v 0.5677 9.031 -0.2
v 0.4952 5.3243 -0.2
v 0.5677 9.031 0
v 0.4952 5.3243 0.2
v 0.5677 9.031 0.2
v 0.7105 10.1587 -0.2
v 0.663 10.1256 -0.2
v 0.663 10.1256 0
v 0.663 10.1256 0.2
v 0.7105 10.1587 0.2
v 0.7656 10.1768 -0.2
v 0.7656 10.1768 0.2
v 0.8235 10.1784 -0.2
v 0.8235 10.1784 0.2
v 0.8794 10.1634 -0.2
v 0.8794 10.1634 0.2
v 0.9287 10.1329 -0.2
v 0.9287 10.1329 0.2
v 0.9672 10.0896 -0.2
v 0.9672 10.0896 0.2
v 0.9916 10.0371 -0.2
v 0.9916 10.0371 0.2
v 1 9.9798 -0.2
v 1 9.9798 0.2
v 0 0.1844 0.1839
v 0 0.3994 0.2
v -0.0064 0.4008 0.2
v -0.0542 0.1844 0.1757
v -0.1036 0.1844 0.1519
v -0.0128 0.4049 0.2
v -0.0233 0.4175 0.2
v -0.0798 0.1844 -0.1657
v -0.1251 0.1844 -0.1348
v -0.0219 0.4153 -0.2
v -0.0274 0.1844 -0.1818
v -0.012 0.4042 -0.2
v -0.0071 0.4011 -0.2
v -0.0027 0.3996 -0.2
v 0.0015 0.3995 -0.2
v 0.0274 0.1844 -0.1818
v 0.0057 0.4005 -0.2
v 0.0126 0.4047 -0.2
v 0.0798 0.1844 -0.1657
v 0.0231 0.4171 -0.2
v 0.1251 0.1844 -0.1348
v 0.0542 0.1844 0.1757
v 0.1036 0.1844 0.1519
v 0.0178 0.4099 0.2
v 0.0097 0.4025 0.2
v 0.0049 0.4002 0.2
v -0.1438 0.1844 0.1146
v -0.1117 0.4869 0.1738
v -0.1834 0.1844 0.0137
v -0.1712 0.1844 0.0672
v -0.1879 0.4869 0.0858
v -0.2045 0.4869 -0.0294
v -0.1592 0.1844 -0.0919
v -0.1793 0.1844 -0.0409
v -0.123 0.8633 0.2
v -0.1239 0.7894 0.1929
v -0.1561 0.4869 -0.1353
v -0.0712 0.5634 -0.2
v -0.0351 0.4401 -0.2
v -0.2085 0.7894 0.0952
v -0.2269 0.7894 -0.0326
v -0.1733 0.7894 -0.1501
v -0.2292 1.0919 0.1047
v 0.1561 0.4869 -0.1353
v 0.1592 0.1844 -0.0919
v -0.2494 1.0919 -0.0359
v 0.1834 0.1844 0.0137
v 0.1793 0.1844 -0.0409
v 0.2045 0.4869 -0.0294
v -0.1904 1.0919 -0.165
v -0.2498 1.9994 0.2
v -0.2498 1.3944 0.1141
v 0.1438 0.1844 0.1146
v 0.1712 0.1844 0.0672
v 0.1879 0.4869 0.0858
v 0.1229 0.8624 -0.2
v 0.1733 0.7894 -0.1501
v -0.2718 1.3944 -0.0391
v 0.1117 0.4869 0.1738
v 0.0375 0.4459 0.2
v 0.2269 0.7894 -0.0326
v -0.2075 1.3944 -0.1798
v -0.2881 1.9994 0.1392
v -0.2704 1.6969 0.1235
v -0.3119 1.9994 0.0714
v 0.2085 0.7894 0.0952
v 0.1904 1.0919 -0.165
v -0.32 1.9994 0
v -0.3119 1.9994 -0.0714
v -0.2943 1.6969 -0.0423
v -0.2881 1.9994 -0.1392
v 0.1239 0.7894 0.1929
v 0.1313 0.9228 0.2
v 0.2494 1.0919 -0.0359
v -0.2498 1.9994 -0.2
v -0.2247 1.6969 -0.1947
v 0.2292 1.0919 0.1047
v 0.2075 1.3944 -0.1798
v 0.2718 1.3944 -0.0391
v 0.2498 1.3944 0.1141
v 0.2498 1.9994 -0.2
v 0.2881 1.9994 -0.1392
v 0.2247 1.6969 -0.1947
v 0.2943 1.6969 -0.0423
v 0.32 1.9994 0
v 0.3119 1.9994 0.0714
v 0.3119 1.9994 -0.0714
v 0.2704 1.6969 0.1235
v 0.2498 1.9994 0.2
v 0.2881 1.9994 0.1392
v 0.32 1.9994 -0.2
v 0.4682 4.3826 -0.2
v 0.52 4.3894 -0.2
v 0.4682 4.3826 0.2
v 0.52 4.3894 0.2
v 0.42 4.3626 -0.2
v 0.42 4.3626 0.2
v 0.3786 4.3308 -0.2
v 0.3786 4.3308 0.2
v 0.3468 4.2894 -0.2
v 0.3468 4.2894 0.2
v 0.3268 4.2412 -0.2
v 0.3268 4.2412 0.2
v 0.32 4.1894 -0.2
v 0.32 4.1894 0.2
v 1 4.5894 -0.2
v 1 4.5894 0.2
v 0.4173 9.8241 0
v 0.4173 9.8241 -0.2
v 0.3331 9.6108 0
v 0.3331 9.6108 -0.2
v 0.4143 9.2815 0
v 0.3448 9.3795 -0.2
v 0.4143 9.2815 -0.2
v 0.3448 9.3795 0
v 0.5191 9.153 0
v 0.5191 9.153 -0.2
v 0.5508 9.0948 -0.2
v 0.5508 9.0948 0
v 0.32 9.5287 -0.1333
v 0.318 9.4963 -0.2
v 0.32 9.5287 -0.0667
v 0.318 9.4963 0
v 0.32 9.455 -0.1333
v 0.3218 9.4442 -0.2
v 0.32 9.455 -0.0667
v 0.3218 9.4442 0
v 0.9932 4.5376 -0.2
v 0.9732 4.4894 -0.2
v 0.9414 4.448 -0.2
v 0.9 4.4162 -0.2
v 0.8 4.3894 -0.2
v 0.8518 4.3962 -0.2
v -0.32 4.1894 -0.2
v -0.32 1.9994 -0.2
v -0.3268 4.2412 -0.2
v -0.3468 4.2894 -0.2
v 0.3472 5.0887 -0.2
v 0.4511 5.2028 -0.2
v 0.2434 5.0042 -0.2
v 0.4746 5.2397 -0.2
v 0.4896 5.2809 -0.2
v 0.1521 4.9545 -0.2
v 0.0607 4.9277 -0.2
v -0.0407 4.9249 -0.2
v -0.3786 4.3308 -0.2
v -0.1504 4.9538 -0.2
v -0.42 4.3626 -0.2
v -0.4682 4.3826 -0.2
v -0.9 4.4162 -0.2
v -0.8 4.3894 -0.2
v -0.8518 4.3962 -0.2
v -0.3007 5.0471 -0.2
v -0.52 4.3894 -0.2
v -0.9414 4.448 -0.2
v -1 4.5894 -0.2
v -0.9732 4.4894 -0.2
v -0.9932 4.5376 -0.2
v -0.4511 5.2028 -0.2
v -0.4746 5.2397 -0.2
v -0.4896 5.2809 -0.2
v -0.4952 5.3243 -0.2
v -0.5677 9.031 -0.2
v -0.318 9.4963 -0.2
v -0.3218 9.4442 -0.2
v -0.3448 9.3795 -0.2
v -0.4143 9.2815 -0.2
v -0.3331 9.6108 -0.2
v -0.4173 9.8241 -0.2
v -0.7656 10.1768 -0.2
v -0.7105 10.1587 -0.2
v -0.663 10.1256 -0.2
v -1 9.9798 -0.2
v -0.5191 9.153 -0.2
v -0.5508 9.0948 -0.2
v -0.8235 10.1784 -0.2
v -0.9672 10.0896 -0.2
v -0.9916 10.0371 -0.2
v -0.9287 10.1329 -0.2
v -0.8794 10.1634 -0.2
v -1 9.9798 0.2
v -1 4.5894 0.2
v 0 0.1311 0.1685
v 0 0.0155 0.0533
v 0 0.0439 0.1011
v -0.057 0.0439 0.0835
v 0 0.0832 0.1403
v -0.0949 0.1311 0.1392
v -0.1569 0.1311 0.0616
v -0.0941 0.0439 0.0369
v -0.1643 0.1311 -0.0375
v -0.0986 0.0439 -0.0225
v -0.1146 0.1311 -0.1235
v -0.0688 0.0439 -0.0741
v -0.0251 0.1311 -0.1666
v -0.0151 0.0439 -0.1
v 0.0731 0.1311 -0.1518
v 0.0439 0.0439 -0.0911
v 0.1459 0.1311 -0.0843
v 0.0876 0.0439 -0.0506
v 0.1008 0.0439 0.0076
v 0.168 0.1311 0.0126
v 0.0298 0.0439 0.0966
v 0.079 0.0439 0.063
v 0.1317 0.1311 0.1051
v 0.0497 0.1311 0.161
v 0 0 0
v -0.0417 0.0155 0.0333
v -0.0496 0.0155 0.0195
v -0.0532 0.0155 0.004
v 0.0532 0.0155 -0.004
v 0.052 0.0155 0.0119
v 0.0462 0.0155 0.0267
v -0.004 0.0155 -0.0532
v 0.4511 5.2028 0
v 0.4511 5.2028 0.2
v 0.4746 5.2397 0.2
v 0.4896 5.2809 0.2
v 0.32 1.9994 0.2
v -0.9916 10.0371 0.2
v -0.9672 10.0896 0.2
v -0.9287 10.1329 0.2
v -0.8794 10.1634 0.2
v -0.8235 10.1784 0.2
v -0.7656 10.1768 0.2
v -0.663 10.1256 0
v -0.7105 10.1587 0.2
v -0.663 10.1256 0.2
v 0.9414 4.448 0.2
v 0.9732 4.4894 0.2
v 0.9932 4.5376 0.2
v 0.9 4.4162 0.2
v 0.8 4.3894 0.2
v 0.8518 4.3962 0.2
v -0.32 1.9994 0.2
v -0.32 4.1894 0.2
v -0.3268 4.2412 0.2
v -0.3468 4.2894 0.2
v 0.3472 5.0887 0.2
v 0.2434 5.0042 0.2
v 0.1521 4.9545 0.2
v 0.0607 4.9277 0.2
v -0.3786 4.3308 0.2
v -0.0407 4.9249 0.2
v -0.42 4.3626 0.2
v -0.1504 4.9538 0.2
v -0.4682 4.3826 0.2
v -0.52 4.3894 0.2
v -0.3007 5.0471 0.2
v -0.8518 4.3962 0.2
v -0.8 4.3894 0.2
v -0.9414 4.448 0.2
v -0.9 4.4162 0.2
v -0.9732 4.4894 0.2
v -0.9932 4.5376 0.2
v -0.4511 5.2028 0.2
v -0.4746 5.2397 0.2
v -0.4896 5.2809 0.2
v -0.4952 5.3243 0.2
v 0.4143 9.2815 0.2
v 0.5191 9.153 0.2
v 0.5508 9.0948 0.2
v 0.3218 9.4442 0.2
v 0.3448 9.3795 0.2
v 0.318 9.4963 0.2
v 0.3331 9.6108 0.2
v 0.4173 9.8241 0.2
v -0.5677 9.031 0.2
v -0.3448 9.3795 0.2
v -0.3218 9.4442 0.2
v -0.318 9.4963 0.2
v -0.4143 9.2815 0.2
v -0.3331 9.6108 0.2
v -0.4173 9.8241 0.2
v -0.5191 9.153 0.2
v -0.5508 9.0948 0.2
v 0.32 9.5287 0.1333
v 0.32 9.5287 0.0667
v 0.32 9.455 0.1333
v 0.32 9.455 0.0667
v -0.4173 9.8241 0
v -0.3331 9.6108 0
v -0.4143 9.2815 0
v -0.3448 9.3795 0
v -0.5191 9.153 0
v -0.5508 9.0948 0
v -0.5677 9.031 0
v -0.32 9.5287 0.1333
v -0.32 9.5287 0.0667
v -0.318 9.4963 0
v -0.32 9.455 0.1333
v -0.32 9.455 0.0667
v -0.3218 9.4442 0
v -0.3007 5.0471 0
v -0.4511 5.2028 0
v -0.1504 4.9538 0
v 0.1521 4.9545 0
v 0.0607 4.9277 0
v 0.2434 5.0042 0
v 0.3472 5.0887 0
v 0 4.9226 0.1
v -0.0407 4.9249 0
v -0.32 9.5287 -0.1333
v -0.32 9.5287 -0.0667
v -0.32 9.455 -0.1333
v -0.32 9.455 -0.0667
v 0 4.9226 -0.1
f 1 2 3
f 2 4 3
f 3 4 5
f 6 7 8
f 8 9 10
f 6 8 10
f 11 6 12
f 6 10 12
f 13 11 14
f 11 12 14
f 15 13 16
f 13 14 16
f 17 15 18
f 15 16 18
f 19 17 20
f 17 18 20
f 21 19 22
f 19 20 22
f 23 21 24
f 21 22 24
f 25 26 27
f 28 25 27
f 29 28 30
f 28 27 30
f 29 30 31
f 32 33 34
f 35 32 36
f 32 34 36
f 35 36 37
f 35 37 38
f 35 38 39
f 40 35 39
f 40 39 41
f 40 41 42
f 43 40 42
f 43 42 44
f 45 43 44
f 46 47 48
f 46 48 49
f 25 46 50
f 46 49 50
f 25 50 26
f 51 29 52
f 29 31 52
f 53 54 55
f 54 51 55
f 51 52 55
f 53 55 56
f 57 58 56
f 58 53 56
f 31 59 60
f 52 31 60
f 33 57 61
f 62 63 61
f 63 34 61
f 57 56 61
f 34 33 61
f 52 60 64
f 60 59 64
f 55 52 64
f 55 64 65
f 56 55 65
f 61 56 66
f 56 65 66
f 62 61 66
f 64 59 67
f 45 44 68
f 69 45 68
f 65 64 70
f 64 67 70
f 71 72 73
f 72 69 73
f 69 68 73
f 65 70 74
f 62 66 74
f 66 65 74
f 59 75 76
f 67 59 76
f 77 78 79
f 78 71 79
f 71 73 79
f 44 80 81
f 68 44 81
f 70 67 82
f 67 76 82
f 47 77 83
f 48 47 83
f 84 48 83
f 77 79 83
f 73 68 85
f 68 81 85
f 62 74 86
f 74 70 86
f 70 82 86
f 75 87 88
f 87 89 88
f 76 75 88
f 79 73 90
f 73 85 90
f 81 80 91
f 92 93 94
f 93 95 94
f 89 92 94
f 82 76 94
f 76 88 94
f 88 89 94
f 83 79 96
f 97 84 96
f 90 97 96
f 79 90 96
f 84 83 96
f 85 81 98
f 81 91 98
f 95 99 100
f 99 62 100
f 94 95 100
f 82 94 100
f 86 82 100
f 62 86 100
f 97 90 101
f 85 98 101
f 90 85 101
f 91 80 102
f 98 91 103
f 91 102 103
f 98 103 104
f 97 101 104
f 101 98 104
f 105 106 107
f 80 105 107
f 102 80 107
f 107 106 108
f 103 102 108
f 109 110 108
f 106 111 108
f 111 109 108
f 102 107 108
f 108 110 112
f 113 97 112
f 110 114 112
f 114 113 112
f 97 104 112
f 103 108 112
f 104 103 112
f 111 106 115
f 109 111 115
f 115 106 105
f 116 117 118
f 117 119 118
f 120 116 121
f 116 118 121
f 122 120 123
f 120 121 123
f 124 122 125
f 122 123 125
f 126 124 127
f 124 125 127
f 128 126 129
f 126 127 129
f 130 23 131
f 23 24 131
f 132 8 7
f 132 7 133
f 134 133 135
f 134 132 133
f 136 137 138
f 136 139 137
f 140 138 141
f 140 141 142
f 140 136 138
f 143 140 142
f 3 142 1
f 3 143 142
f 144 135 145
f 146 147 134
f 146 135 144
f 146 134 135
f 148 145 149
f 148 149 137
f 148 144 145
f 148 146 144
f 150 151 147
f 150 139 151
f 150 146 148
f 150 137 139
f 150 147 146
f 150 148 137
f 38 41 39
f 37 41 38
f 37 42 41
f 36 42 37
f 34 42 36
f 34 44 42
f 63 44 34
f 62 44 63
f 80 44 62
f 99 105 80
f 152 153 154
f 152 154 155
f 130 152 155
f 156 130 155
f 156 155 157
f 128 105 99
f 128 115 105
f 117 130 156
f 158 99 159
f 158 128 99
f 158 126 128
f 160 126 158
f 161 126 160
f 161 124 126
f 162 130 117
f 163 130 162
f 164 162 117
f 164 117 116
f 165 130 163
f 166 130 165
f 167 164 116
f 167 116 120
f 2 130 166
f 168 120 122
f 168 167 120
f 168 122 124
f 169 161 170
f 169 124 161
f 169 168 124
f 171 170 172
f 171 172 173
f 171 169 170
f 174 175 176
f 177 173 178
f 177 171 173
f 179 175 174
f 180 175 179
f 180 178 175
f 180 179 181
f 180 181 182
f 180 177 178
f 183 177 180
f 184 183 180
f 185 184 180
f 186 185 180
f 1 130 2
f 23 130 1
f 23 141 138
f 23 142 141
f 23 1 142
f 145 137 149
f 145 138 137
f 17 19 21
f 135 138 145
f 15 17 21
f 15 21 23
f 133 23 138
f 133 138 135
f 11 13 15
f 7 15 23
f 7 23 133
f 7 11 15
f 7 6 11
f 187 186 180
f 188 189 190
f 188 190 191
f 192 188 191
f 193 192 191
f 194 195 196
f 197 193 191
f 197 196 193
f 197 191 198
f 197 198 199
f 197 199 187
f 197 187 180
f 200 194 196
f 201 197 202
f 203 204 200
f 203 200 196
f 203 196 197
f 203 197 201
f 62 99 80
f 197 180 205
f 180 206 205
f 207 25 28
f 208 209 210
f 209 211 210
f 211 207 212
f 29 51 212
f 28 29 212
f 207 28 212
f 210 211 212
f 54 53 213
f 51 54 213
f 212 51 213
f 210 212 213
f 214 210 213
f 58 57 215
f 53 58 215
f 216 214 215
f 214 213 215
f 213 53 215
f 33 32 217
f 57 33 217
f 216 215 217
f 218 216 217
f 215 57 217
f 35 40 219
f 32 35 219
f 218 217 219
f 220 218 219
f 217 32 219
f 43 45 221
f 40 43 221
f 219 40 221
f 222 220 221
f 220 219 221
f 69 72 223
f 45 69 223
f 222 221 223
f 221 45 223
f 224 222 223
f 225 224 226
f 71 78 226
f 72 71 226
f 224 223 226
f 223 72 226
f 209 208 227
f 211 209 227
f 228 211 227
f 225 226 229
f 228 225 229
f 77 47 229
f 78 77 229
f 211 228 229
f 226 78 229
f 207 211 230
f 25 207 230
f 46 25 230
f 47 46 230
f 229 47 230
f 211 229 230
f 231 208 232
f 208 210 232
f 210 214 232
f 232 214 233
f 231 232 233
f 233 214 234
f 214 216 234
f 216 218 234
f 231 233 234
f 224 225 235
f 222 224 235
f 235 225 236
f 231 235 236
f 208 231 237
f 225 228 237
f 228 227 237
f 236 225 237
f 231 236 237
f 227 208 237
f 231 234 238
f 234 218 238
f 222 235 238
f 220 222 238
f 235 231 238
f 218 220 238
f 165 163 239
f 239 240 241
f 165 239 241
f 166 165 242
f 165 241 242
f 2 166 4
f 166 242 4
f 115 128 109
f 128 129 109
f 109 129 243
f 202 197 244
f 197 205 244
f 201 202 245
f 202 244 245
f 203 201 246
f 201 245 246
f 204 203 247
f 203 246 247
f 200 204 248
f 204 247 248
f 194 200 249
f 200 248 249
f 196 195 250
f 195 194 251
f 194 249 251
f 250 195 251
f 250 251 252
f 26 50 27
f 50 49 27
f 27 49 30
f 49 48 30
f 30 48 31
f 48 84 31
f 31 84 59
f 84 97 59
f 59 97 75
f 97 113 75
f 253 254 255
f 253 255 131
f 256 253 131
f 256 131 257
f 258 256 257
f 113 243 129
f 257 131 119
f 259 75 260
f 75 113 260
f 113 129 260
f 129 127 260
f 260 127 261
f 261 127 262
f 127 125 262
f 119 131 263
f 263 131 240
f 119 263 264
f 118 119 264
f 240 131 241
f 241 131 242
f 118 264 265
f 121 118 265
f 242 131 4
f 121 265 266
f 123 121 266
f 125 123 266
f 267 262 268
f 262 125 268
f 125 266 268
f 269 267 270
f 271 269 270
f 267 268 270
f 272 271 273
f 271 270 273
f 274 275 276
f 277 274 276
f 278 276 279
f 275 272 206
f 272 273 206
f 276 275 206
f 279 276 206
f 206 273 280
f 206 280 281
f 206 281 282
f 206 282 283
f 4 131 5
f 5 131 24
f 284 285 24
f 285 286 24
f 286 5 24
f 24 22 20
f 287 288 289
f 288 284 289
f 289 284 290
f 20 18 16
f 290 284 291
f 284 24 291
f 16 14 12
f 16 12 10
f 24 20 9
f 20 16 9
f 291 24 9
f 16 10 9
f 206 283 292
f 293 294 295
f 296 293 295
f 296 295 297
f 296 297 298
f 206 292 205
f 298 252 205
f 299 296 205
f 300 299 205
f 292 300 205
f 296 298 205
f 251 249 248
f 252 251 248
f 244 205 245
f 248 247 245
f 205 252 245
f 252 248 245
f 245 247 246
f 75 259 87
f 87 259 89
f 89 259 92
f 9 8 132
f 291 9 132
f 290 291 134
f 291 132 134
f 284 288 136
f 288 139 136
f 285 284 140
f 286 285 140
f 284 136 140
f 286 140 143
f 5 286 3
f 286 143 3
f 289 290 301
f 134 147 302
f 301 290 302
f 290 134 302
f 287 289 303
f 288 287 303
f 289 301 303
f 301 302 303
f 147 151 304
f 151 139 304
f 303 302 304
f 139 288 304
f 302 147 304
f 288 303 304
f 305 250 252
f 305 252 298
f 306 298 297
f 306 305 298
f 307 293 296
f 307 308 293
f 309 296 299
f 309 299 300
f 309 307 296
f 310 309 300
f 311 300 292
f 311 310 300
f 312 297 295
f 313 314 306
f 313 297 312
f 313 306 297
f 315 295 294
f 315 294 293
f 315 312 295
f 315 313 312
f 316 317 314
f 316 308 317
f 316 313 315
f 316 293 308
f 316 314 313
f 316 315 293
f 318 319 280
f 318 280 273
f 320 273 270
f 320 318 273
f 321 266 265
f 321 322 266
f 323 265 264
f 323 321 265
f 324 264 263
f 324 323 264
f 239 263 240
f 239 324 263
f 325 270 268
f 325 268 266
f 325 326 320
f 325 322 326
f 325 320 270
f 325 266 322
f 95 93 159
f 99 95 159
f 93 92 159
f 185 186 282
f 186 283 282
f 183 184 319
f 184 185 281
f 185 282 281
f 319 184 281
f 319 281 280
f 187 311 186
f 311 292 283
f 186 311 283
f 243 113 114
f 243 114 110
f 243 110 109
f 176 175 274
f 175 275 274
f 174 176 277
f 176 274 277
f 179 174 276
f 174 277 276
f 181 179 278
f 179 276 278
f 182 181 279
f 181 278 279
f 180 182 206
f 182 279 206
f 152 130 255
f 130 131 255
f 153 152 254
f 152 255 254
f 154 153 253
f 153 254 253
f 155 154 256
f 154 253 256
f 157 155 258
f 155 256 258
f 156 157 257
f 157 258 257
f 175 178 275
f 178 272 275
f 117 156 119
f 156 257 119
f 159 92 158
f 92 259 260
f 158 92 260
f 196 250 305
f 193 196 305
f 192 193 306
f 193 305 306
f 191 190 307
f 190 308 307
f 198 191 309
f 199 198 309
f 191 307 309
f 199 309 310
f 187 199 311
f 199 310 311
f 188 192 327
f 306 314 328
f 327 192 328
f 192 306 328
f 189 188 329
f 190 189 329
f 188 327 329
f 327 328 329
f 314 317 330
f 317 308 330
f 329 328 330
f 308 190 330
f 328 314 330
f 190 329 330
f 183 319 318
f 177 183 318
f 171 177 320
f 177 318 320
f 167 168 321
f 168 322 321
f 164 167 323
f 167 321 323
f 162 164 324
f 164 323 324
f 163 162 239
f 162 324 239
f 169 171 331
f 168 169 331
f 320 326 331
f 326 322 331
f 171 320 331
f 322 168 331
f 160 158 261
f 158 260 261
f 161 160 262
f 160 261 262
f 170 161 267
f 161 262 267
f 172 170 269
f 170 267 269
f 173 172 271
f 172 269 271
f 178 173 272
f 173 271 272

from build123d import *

# Parameters (mm, degrees)
BOSS_EXTRUDE1_DEPTH = 0.2


with BuildPart() as part:
    # Sketch1 → Boss-Extrude1 (new body, symmetric)
    with BuildSketch(Plane.XY):
        with BuildLine():
            Line((-0.32, 1.999393664), (-0.32, 4.189393664))
            ThreePointArc((-0.32, 4.189393664), (-0.378578644, 4.33081502), (-0.52, 4.389393664))
            Line((-0.52, 4.389393664), (-0.8, 4.389393664))
            ThreePointArc((-0.8, 4.389393664), (-0.941421356, 4.447972308), (-1, 4.589393664))
            Line((-1, 4.589393664), (-1, 9.979817201))
            ThreePointArc((-1, 9.979817201), (-0.87939743, 10.163382034), (-0.663039519, 10.125562961))
            add(Edge.make_bspline(
                [(-0.663039519, 10.125562961), (-0.487599251, 9.960697902), (-0.326177604, 9.738773555), (-0.310671132, 9.310865905), (-0.548453888, 9.198603212), (-0.567669208, 9.030963485)],
                knots=[0.253308427, 0.253308427, 0.253308427, 0.253308427, 0.663171976, 0.707067436, 1, 1, 1, 1], degree=3))
            Line((-0.567669208, 9.030963485), (-0.495215905, 5.324303234))
            ThreePointArc((-0.495215905, 5.324303234), (-0.483221967, 5.259888483), (-0.451053839, 5.202806733))
            add(Edge.make_bspline(
                [(-0.451053839, 5.202806733), (0, 4.642430299), (0.451053839, 5.202806733)],
                knots=[0.043404734, 0.043404734, 0.043404734, 0.956595266, 0.956595266, 0.956595266], degree=2))
            ThreePointArc((0.451053839, 5.202806733), (0.483221967, 5.259888483), (0.495215905, 5.324303234))
            Line((0.495215905, 5.324303234), (0.567669208, 9.030963485))
            add(Edge.make_bspline(
                [(0.663039519, 10.125562961), (0.487599251, 9.960697902), (0.326177604, 9.738773555), (0.310671132, 9.310865905), (0.548453888, 9.198603212), (0.567669208, 9.030963485)],
                knots=[0.253308427, 0.253308427, 0.253308427, 0.253308427, 0.663171976, 0.707067436, 1, 1, 1, 1], degree=3))
            ThreePointArc((0.663039519, 10.125562961), (0.87939743, 10.163382034), (1, 9.979817201))
            Line((1, 9.979817201), (1, 4.589393664))
            ThreePointArc((1, 4.589393664), (0.941421356, 4.447972308), (0.8, 4.389393664))
            Line((0.8, 4.389393664), (0.52, 4.389393664))
            ThreePointArc((0.52, 4.389393664), (0.378578644, 4.33081502), (0.32, 4.189393664))
            Line((0.32, 4.189393664), (0.32, 1.999393664))
            Line((0.32, 1.999393664), (0.183878151, 0.184435674))
            ThreePointArc((0.183878151, 0.184435674), (0.126073555, 0.058186541), (0, 0))
            ThreePointArc((0, 0), (-0.126073555, 0.058186541), (-0.183878151, 0.184435674))
            Line((-0.183878151, 0.184435674), (-0.32, 1.999393664))
        make_face()
    extrude(amount=BOSS_EXTRUDE1_DEPTH, both=True)

    # Esquisse1 → Enlèvement de matière-Révolution1 (revolve, cut)
    with BuildSketch(Plane.XY, mode=Mode.PRIVATE) as enl_vement_de_mati_re_r_volution1_sk:
        with BuildLine():
            Line((1, -0.500606336), (0, -0.500606336))
            Line((0, -0.500606336), (0, 0))
            ThreePointArc((0, 0), (0.121956037, 0.062291613), (0.183878151, 0.184435674))
            Line((0.183878151, 0.184435674), (0.32, 1.999393664))
            Line((0.32, 1.999393664), (1, 1.999393664))
            Line((1, 1.999393664), (1, -0.500606336))
        make_face()
    revolve(enl_vement_de_mati_re_r_volution1_sk.sketch.rotate(Axis((0, 4.922618516, 0), (0, -1, 0)), 90), axis=Axis((0, 4.922618516, 0), (0, -1, 0)), mode=Mode.SUBTRACT)  # turned: the seam where the file's is


solid = part.part
